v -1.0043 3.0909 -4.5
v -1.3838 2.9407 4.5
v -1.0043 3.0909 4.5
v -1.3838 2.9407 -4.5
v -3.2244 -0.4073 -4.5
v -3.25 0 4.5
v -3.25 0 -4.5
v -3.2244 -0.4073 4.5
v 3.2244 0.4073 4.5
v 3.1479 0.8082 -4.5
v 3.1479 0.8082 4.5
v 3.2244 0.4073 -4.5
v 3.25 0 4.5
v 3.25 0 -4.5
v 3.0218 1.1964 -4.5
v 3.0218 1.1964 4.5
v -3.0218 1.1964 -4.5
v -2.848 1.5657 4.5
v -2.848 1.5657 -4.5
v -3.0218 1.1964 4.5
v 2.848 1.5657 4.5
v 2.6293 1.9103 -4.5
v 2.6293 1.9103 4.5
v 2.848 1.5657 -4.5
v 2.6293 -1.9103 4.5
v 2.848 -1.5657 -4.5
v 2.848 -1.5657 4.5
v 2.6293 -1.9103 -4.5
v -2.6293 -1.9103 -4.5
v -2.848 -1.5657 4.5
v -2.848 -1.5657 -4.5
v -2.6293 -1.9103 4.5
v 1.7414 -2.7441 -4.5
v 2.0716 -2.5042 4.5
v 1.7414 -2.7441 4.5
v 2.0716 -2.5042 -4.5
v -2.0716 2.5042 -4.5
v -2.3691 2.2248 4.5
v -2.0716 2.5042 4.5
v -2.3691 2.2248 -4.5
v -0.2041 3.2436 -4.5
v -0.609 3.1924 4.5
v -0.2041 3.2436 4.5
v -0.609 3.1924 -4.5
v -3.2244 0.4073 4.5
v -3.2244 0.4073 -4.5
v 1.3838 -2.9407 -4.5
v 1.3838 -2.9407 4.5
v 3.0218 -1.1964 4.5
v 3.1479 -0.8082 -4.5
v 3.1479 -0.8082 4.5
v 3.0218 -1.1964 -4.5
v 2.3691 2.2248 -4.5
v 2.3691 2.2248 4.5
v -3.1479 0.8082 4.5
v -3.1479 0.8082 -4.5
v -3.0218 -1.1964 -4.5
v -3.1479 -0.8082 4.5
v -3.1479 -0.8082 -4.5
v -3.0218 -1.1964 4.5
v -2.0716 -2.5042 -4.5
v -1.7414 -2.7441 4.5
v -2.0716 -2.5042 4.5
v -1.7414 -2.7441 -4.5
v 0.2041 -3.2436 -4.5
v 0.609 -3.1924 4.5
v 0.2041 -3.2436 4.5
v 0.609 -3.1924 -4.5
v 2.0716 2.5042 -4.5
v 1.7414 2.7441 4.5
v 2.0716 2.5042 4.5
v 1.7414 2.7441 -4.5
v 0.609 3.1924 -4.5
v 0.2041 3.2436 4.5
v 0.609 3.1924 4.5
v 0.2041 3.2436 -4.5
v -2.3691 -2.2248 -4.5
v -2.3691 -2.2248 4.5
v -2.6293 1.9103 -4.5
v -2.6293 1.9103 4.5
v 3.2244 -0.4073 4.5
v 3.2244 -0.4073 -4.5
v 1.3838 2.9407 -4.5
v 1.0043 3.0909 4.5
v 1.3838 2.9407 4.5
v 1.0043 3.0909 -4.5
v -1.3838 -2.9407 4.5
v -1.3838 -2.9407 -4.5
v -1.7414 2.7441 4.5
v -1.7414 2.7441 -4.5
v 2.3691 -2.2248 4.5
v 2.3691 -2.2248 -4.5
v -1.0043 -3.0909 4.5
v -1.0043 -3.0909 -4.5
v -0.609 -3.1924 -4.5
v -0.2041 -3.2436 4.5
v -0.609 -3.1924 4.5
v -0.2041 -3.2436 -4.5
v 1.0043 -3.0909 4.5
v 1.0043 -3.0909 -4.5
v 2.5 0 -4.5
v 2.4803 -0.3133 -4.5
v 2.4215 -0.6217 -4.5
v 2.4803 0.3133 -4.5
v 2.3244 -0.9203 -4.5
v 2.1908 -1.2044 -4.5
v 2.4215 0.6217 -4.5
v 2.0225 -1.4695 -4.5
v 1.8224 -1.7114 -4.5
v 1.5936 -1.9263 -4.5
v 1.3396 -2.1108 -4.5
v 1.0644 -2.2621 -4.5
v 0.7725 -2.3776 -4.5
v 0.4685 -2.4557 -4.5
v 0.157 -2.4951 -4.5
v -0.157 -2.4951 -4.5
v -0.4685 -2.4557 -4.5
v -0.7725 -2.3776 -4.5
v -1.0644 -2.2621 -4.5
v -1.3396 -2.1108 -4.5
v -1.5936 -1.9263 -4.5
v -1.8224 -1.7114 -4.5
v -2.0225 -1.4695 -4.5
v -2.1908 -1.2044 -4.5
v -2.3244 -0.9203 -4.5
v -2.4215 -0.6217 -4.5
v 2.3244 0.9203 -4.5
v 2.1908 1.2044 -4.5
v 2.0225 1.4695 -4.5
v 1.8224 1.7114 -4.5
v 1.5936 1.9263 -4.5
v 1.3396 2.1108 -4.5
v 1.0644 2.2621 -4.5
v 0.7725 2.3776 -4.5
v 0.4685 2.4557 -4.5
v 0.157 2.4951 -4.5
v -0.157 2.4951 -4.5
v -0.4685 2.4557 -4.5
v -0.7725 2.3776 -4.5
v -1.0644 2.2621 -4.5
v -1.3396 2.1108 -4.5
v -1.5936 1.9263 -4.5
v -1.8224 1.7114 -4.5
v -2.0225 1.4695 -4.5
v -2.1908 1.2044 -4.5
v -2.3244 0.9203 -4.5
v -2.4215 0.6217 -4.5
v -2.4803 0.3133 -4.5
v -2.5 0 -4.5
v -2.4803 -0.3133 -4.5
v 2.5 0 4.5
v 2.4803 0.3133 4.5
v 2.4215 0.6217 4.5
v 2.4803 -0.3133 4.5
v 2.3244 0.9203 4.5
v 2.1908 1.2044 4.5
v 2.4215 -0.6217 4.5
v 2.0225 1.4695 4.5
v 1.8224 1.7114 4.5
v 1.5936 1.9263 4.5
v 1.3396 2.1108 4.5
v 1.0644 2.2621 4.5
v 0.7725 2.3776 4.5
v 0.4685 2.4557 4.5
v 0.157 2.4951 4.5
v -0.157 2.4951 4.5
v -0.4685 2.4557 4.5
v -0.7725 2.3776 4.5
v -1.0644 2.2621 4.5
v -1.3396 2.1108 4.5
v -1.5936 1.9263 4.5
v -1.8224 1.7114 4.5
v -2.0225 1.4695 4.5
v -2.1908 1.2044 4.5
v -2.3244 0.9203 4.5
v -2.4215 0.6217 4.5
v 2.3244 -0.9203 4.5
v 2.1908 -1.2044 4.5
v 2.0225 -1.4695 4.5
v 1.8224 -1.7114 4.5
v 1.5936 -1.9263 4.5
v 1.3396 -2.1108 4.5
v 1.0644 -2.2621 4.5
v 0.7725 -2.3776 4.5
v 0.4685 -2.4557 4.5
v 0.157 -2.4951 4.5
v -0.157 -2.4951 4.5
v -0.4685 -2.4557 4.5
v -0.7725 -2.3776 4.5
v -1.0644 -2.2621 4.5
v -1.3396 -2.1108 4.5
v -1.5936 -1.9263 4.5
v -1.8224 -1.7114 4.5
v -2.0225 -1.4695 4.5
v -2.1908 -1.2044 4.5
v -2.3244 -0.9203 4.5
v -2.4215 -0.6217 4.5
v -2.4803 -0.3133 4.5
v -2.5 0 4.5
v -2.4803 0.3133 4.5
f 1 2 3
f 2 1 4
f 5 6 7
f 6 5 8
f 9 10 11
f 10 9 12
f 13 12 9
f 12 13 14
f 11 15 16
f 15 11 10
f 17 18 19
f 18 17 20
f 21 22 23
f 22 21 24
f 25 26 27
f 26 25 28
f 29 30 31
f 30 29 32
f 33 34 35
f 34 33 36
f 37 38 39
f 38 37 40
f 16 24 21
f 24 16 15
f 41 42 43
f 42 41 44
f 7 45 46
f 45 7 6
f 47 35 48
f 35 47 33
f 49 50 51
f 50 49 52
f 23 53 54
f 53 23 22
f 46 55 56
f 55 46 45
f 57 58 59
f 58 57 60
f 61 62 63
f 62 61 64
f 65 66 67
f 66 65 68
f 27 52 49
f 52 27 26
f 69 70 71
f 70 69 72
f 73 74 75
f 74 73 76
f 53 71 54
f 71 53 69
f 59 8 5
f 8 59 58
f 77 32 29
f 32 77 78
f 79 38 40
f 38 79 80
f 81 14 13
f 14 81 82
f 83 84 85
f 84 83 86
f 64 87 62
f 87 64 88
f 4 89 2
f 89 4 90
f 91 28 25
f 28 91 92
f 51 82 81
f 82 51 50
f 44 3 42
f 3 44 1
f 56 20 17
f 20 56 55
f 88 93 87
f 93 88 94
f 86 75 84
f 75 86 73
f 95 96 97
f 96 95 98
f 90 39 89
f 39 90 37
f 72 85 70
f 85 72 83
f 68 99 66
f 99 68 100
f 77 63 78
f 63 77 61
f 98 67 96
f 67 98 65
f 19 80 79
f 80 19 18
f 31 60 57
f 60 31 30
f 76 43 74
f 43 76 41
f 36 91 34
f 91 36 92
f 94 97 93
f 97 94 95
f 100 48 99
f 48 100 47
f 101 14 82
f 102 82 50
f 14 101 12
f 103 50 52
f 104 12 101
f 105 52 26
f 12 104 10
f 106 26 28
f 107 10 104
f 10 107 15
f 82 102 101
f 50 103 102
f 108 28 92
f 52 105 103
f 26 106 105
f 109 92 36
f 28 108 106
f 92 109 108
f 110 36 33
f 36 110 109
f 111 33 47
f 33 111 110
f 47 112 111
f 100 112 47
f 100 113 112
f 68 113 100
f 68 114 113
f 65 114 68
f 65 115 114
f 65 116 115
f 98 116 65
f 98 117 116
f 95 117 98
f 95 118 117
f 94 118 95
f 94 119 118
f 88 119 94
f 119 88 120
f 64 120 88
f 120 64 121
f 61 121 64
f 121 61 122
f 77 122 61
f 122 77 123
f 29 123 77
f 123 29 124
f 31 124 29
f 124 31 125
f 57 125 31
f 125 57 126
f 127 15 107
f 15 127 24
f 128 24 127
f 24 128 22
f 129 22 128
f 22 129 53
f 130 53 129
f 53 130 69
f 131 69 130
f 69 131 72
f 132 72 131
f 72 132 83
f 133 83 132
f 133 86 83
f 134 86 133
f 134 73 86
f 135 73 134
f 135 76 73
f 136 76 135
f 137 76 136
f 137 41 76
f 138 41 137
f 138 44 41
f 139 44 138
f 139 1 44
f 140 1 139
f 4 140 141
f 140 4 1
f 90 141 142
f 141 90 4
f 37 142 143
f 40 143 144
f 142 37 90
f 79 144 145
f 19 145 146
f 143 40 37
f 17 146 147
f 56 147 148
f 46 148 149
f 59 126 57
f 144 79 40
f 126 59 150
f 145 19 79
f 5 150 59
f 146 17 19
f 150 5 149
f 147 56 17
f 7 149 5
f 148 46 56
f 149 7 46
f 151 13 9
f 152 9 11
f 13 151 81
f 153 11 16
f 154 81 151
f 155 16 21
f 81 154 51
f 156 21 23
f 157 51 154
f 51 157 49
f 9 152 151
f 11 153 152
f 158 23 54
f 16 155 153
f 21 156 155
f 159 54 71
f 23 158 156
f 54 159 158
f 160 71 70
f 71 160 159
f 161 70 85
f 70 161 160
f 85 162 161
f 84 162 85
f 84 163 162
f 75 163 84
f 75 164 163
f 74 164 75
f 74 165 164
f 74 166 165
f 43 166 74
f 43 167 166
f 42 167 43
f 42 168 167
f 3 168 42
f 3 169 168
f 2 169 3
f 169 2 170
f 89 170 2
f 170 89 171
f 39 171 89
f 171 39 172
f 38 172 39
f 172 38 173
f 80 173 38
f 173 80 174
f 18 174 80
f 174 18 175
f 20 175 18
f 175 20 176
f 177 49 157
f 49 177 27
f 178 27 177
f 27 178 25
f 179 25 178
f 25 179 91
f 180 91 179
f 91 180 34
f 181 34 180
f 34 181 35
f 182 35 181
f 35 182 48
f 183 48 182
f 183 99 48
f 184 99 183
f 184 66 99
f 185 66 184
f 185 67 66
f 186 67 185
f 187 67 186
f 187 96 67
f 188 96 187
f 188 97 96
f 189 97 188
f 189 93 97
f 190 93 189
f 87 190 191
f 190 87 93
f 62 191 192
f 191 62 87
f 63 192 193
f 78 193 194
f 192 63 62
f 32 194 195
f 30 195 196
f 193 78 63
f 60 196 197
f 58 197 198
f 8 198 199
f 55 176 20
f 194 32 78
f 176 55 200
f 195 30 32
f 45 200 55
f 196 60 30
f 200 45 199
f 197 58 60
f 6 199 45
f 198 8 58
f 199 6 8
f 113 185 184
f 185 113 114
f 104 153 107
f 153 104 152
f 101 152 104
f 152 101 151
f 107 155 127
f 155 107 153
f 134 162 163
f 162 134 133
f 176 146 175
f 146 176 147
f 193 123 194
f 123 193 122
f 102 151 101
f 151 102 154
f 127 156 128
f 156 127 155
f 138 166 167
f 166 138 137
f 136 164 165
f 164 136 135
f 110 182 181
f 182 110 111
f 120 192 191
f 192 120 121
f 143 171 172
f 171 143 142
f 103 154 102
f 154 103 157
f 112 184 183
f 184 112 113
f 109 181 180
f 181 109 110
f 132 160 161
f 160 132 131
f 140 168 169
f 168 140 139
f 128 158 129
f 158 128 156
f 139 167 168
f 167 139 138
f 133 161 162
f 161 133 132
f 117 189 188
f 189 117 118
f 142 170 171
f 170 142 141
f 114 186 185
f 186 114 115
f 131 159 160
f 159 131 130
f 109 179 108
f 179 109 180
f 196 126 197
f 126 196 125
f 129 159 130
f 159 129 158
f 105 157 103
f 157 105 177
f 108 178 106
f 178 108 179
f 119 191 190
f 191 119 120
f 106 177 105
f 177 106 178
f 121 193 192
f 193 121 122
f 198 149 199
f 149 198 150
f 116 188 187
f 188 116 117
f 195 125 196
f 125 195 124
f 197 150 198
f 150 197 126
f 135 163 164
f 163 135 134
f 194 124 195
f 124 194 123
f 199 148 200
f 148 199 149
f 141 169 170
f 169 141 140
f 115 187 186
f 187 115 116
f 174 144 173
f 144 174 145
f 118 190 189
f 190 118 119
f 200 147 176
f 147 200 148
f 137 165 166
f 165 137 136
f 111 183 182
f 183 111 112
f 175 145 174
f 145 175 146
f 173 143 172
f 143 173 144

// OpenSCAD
$fn = 50;


difference() {
	union() {
		translate(v = [0, 0, -4.5000000000]) {
			cylinder(h = 9, r = 3.2500000000);
		}
	}
	union() {
		translate(v = [0, 0, -100.0000000000]) {
			cylinder(h = 200, r = 2.5000000000);
		}
	}
}
